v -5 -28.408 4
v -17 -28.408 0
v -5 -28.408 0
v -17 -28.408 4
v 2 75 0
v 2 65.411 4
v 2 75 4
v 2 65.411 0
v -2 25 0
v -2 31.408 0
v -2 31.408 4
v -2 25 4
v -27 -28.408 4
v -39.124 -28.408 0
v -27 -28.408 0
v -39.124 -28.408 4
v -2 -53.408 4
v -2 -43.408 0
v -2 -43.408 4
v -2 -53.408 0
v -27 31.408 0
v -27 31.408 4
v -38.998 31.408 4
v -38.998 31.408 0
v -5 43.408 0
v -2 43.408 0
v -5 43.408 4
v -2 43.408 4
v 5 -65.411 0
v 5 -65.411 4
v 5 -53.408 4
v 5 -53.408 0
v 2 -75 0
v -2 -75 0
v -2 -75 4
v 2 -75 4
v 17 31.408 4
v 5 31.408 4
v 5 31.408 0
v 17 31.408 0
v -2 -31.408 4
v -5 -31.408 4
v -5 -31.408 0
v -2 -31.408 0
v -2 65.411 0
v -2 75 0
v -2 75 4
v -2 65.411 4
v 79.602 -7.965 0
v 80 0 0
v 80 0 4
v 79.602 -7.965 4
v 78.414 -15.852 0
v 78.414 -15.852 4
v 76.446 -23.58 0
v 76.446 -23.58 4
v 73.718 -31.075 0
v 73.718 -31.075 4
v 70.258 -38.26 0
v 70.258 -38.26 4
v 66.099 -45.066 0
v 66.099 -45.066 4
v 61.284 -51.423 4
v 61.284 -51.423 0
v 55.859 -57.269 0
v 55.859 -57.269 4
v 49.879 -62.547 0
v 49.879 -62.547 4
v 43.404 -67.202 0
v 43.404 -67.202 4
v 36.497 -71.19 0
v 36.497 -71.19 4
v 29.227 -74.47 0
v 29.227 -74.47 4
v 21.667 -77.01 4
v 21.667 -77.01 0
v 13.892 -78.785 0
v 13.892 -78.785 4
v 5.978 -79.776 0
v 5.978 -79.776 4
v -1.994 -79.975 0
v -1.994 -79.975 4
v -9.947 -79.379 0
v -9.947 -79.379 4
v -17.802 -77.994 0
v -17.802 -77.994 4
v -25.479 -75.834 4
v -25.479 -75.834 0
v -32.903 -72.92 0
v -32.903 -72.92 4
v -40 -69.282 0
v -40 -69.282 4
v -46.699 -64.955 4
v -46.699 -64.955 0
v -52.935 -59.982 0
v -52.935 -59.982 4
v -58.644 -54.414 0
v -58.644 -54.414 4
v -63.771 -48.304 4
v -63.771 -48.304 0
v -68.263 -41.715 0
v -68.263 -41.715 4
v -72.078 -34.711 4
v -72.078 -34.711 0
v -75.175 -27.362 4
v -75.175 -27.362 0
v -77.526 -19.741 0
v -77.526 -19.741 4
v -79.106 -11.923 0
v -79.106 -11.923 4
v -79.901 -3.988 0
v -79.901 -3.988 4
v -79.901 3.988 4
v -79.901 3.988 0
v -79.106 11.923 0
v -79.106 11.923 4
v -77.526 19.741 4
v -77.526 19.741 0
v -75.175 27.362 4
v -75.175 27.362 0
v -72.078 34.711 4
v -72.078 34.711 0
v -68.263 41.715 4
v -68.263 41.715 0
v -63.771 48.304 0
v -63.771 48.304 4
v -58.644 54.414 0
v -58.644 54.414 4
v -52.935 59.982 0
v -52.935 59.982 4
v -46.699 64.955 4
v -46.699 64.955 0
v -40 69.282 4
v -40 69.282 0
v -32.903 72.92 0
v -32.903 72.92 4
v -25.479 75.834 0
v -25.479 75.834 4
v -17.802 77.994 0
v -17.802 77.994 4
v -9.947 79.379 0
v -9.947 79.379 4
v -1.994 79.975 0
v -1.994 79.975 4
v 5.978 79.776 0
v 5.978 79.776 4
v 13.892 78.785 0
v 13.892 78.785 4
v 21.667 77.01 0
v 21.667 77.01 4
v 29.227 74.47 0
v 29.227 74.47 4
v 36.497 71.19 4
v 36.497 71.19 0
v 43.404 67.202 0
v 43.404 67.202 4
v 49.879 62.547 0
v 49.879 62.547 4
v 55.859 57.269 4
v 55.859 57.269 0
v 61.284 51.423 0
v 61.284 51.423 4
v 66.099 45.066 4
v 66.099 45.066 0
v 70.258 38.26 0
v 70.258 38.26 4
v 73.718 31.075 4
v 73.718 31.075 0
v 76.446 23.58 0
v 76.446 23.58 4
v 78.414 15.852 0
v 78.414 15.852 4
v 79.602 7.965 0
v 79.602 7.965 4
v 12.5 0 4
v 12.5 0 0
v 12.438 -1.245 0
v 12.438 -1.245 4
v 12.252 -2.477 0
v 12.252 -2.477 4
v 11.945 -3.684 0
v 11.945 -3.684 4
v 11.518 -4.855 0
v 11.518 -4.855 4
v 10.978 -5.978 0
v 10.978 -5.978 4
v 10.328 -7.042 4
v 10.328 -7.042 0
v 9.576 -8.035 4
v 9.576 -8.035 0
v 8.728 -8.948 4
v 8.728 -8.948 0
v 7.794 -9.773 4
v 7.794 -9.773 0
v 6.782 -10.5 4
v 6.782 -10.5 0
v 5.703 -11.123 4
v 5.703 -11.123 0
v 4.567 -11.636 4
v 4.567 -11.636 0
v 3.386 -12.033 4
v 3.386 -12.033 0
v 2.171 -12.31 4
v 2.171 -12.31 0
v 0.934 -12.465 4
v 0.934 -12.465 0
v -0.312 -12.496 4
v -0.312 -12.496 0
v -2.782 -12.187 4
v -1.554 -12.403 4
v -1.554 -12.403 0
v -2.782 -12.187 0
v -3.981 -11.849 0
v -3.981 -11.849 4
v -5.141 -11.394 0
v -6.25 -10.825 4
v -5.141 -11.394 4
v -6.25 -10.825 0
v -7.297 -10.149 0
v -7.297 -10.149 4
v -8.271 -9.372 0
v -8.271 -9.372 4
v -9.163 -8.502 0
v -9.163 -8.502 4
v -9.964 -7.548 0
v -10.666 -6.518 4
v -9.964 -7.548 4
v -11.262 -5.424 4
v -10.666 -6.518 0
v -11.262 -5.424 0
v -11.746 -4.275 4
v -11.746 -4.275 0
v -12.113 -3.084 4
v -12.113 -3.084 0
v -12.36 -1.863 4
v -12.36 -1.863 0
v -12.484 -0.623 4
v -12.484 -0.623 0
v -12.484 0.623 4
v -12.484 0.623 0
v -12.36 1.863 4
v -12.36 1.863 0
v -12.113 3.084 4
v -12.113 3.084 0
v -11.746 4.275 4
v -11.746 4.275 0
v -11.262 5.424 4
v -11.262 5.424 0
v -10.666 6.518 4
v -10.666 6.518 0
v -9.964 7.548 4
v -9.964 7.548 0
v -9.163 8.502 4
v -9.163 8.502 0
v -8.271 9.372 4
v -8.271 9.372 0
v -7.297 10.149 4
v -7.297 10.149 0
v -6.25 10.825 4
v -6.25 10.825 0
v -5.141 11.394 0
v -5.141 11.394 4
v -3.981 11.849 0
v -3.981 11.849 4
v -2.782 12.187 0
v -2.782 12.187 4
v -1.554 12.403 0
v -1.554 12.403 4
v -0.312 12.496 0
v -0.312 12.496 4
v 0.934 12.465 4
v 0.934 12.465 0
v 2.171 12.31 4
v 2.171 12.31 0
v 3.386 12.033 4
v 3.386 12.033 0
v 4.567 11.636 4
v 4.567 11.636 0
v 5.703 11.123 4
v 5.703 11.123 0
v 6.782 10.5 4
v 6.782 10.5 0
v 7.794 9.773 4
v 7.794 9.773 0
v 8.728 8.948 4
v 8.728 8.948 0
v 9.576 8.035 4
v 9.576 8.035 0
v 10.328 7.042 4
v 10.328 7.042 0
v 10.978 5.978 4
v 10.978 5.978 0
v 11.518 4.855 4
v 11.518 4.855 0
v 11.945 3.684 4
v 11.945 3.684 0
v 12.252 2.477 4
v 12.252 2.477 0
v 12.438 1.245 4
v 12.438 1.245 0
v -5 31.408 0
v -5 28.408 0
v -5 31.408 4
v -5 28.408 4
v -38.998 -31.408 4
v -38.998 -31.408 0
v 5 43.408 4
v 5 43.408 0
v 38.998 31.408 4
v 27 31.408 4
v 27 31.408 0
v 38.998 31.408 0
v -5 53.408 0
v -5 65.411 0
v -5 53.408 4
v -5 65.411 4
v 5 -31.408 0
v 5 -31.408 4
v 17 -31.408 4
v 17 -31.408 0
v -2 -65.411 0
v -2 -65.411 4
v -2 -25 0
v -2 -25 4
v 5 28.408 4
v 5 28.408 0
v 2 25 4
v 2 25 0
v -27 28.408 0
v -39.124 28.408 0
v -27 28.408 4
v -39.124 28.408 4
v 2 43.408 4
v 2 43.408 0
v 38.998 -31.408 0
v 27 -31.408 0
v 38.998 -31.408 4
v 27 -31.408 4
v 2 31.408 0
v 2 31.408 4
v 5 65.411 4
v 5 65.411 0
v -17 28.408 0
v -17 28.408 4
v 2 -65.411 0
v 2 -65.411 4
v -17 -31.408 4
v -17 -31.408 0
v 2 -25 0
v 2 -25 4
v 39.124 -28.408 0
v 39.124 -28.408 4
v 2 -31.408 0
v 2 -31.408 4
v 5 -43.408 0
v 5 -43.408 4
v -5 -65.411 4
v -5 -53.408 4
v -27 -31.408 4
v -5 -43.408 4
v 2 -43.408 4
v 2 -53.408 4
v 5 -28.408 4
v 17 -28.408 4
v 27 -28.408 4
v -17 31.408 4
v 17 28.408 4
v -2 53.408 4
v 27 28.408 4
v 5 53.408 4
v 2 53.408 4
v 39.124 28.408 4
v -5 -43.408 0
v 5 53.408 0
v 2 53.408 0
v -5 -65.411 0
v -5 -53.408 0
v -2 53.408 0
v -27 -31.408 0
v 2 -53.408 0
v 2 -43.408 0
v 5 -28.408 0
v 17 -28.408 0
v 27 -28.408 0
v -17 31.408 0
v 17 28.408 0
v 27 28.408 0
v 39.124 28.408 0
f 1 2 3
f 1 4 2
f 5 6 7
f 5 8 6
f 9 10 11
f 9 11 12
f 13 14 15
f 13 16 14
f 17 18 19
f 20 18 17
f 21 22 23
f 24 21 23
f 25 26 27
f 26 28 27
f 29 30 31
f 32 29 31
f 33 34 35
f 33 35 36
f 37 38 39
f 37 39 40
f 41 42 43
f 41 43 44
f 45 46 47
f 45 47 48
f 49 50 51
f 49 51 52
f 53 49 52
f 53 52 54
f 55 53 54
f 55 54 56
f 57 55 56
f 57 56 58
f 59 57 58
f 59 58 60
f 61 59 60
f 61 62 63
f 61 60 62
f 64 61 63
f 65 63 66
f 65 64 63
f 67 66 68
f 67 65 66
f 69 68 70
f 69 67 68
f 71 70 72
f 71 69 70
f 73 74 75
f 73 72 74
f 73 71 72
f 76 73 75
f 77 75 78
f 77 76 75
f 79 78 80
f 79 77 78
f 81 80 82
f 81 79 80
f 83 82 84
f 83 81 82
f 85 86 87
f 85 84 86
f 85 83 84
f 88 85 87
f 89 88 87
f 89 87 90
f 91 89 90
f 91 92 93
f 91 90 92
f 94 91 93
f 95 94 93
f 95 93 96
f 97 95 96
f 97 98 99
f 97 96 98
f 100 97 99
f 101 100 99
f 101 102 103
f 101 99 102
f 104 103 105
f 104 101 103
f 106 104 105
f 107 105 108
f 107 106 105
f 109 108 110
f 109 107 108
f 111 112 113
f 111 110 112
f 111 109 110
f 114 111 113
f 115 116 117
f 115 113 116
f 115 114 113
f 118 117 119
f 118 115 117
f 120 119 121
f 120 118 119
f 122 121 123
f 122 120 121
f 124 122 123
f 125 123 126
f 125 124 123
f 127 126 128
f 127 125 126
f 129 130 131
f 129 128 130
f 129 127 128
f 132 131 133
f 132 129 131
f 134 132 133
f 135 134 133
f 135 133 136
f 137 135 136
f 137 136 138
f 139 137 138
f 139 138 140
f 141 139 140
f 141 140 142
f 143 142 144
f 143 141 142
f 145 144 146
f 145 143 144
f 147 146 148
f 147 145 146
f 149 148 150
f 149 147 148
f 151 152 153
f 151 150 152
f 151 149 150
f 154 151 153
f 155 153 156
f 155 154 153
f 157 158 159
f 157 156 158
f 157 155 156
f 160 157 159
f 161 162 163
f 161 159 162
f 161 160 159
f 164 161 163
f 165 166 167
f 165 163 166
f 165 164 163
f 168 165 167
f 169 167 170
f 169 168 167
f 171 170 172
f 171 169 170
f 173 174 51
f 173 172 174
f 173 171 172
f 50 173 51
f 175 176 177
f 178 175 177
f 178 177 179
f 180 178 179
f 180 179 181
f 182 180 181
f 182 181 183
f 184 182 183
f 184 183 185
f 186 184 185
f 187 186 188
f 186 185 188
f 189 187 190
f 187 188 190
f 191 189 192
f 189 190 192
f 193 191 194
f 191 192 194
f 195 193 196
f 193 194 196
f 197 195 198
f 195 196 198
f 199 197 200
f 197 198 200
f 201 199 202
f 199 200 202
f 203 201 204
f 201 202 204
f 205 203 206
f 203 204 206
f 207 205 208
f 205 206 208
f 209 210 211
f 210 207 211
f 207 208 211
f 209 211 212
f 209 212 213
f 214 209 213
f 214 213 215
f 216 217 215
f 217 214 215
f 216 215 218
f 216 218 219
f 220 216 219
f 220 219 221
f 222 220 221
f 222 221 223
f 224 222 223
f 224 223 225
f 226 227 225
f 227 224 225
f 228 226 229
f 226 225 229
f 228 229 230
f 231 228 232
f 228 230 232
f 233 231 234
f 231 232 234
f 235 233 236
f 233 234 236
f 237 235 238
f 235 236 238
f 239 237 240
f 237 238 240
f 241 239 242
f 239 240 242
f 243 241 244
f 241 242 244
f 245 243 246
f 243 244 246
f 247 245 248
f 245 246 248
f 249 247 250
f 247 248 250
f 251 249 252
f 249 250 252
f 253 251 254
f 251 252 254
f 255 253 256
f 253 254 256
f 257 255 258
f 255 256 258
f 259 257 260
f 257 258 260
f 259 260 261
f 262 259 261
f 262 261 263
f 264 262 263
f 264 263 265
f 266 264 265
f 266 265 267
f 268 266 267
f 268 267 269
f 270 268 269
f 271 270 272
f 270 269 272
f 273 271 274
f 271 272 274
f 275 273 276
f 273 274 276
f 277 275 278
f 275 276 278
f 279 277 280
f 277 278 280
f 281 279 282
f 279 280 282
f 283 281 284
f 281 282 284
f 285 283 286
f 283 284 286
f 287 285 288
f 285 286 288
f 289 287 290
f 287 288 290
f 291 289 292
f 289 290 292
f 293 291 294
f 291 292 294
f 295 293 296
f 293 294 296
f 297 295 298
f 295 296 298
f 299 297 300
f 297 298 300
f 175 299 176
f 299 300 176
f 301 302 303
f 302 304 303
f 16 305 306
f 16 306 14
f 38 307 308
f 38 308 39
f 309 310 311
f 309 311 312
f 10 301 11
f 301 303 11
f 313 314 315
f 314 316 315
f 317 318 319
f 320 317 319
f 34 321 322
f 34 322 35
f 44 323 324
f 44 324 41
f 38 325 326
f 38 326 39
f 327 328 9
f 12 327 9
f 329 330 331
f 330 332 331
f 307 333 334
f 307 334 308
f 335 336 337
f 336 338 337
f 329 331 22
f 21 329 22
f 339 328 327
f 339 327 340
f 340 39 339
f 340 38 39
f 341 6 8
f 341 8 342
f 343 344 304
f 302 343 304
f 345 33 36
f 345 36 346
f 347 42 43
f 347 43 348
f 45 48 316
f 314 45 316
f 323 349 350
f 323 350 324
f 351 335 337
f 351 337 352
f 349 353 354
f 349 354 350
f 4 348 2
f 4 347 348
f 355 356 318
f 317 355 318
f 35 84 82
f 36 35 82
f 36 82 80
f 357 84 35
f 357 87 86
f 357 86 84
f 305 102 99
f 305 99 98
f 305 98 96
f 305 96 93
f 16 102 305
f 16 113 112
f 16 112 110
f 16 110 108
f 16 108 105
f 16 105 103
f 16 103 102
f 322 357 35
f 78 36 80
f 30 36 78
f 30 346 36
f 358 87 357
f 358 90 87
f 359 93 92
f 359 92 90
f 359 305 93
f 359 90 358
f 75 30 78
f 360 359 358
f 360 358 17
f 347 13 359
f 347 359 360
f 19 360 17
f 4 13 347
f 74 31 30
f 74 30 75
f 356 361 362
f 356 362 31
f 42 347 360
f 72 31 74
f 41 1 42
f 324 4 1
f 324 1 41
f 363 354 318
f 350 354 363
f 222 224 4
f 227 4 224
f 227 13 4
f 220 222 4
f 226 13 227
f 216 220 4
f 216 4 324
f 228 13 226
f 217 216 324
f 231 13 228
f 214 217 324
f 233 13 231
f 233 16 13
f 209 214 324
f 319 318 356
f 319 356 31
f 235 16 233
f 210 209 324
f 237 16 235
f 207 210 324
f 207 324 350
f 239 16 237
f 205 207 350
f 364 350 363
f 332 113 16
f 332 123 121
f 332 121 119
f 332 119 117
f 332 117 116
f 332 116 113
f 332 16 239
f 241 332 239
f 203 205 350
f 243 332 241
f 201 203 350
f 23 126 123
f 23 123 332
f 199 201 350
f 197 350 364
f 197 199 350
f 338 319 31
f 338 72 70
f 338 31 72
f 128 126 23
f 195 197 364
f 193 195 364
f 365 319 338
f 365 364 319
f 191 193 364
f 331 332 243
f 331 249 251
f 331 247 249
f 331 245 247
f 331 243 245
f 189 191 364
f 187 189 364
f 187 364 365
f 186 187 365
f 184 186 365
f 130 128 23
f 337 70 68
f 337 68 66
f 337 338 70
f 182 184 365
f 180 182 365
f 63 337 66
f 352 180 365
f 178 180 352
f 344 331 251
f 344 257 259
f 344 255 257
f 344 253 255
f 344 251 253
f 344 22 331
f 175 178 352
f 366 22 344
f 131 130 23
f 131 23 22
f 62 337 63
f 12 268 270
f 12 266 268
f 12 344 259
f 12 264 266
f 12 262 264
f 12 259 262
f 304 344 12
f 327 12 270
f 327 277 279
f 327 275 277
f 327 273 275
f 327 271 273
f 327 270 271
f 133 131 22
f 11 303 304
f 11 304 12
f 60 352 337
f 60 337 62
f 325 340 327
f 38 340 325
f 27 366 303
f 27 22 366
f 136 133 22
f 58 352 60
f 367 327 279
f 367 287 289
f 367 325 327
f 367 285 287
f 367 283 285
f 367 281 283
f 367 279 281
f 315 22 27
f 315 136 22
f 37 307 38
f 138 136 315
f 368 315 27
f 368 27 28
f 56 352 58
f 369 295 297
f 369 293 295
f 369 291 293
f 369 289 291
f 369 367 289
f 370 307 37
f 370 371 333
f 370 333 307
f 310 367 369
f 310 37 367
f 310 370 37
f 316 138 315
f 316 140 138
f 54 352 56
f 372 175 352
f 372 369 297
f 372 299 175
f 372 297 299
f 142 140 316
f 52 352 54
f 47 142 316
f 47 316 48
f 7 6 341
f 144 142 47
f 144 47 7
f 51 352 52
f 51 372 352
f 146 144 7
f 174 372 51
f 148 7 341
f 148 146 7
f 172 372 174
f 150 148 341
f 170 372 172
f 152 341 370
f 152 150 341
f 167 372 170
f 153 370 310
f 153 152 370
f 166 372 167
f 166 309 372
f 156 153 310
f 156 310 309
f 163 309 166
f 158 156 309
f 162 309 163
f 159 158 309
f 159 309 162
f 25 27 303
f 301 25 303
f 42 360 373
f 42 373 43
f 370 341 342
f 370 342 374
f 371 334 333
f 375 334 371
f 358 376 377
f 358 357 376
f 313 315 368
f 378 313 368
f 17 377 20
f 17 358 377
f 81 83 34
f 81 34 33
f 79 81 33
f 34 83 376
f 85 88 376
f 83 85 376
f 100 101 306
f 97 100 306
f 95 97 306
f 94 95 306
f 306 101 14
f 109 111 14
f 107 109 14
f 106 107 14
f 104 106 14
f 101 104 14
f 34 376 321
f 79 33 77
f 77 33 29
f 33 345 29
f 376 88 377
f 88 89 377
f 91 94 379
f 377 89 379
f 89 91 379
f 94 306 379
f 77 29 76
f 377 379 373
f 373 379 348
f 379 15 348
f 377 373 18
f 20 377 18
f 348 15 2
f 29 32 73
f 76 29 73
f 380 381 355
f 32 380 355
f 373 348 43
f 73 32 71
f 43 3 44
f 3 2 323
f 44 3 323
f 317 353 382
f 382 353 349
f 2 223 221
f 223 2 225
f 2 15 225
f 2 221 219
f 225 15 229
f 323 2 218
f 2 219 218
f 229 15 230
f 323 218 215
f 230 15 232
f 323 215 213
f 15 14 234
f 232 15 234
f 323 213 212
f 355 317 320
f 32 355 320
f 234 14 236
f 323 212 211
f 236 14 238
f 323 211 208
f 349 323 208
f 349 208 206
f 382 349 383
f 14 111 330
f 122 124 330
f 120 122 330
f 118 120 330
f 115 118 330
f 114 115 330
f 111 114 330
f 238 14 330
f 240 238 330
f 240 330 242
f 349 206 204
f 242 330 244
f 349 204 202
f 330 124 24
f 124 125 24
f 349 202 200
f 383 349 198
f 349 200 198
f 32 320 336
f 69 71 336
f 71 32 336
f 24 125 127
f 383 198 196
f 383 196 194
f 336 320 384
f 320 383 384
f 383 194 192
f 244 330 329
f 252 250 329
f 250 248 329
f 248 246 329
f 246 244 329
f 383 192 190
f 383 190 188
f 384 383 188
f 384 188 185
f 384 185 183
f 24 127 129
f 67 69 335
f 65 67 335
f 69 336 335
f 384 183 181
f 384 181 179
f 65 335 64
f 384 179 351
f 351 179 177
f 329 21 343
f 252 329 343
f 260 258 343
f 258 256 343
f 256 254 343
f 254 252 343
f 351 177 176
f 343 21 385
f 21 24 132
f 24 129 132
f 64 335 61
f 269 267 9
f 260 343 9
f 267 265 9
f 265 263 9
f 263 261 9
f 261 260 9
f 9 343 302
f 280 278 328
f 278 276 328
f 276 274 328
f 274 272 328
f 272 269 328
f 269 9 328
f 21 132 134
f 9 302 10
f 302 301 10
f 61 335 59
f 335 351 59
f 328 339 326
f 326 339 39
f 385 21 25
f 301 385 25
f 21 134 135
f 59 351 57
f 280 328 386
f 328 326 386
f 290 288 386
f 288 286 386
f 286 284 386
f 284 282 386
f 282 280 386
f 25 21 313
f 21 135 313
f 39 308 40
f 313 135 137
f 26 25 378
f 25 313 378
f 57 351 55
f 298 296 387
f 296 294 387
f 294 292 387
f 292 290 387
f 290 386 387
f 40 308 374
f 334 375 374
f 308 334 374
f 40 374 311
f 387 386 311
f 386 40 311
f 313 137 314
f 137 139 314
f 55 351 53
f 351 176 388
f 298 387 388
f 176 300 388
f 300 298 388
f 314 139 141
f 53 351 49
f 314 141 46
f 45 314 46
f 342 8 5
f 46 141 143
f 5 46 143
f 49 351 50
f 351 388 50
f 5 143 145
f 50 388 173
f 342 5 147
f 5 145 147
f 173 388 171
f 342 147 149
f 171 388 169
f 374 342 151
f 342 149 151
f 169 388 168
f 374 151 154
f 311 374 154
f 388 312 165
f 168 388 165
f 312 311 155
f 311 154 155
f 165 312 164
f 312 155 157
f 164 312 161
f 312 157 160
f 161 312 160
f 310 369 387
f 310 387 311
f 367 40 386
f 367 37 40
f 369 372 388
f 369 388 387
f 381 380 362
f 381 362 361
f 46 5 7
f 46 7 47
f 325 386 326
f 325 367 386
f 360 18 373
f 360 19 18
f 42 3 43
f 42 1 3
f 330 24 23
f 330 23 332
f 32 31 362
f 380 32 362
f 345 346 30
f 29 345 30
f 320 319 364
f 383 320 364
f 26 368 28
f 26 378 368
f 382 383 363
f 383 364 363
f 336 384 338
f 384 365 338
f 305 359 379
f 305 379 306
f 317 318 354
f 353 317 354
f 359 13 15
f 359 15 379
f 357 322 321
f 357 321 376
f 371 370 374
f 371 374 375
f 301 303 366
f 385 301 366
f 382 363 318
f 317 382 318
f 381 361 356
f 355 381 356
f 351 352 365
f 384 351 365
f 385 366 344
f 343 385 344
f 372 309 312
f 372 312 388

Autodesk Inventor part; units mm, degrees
ref_plane "YZ Plane" through (0, 0, 0) normal (1, 0, 0) x (0, 1, 0)
ref_plane "XZ Plane" through (0, 0, 0) normal (0, 1, 0) x (-1, 0, 0)
ref_plane "XY Plane" through (0, 0, 0) normal (0, 0, 1) x (1, 0, 0)
sketch "Эскиз1" plane through (0, 0, 0) normal (0, 0, 1) x (1, 0, 0)
  circle A0 centre (0, 0) radius 80 projected
  line L0 (-52.7251, -56.1362) -> (-52.7358, -38.0942) construction
  arc A1 (-51.7364, -37.0936) -> (-52.7358, -38.0942) centre (-51.7358, -38.0936) ccw construction
  line L1 (-51.7364, -37.0936) -> (-13.2571, -37.0709) construction
  arc A2 (-12.2565, -38.0703) -> (-13.2571, -37.0709) centre (-13.2565, -38.0709) ccw construction
  line L2 (-12.2565, -38.0703) -> (-12.2459, -56.1122) construction
  arc A3 (-13.2453, -57.1128) -> (-12.2459, -56.1122) centre (-13.2459, -56.1128) ccw construction
  line L3 (-13.2453, -57.1128) -> (-51.7245, -57.1356) construction
  arc A4 (-52.7251, -56.1362) -> (-51.7245, -57.1356) centre (-51.7251, -56.1356) ccw construction
  circle A5 centre (-11.4805, -27.7164) radius 3.15 construction
  circle A6 centre (-27.7164, 11.4805) radius 3.15 construction
  circle A7 centre (11.4805, 27.7164) radius 3.15 construction
  circle A8 centre (27.7164, -11.4805) radius 3.15 construction
  circle A9 centre (0, 0) radius 12.5
  circle A10 centre (0, 0) radius 39.5 construction
  point P0 (0, 0)
  dimension "d10" = 25
extrude "Выдавливание1" add sketch "Эскиз1" along normal blind 4
sketch "Эскиз2" plane through (0, 0, 0) normal (0, 0, -1) x (-1, 0, 0)
  circle A0 centre (0, 0) radius 80 projected
  line L0 (0, 80) -> (0, -80) construction
  line L1 (2, -75) -> (-2, -75)
  line L2 (-2, -75) -> (-2, 75)
  line L3 (-2, 75) -> (2, 75)
  line L4 (2, 75) -> (2, -75)
  line L5 (2, -75) -> (-2, 75) construction
  line L6 (-2, -75) -> (2, 75) construction
  line L7 (-2, 25) -> (2, 25)
  line L8 (-2, -25) -> (2, -25)
  point P0 (0, -25)
  point P1 (0, 75)
  point P2 (0, 25)
  dimension "d2" = 4
  dimension "d3" = 150
  dimension "d4" = 50
  dimension "d5" = 50
extrude "Выдавливание2" cut sketch "Эскиз2" against normal blind 10 contours L1 L2 L8 L4 | L7 L2 L3 L4
sketch "Эскиз3" plane through (0, 0, 4) normal (0, 0, 1) x (1, 0, 0)
  line L0 (5, 53.408) -> (2, 53.408)
  line L1 (2, 31.408) -> (2, 43.408)
  line L2 (17, 28.408) -> (5, 28.408)
  line L3 (39.1243, 28.408) -> (27, 28.408)
  line L4 (2, 53.408) -> (2, 65.4106)
  line L5 (5, 65.4106) -> (5, 53.408)
  line L6 (2, 65.4106) -> (5, 65.4106)
  line L7 (2, 43.408) -> (5, 43.408)
  line L8 (5, 31.408) -> (2, 31.408)
  line L9 (5, 43.408) -> (5, 31.408)
  line L10 (5, 28.408) -> (5, 31.408)
  line L11 (5, 31.408) -> (17, 31.408)
  line L12 (27, 31.408) -> (38.9975, 31.408)
  line L13 (38.9975, 31.408) -> (39.1243, 28.408)
  line L14 (17, 31.408) -> (17, 28.408)
  line L15 (27, 28.408) -> (27, 31.408)
  line L16 (5, 65.4121) -> (5, 65.4106)
  line L17 (102, 0) -> (-112, 0) construction
  line L18 (5, -53.408) -> (2, -53.408)
  line L19 (2, -31.408) -> (2, -43.408)
  line L20 (17, -28.408) -> (5, -28.408)
  line L21 (39.1243, -28.408) -> (27, -28.408)
  line L22 (2, -53.408) -> (2, -65.4106)
  line L23 (5, -65.4106) -> (5, -53.408)
  line L24 (2, -65.4106) -> (5, -65.4106)
  line L25 (2, -43.408) -> (5, -43.408)
  line L26 (5, -31.408) -> (2, -31.408)
  line L27 (5, -43.408) -> (5, -31.408)
  line L28 (5, -28.408) -> (5, -31.408)
  line L29 (5, -31.408) -> (17, -31.408)
  line L30 (27, -31.408) -> (38.9975, -31.408)
  line L31 (38.9975, -31.408) -> (39.1243, -28.408)
  line L32 (17, -31.408) -> (17, -28.408)
  line L33 (27, -28.408) -> (27, -31.408)
  line L34 (5, -65.4121) -> (5, -65.4106)
  line L35 (0, 116) -> (0, -113) construction
  line L36 (-5, 53.408) -> (-2, 53.408)
  line L37 (-2, 31.408) -> (-2, 43.408)
  line L38 (-17, 28.408) -> (-5, 28.408)
  line L39 (-39.1243, 28.408) -> (-27, 28.408)
  line L40 (-2, 53.408) -> (-2, 65.4106)
  line L41 (-5, 65.4106) -> (-5, 53.408)
  line L42 (-2, 65.4106) -> (-5, 65.4106)
  line L43 (-2, 43.408) -> (-5, 43.408)
  line L44 (-5, 31.408) -> (-2, 31.408)
  line L45 (-5, 43.408) -> (-5, 31.408)
  line L46 (-5, 28.408) -> (-5, 31.408)
  line L47 (-5, 31.408) -> (-17, 31.408)
  line L48 (-27, 31.408) -> (-38.9975, 31.408)
  line L49 (-38.9975, 31.408) -> (-39.1243, 28.408)
  line L50 (-17, 31.408) -> (-17, 28.408)
  line L51 (-27, 28.408) -> (-27, 31.408)
  line L52 (-5, 65.4121) -> (-5, 65.4106)
  line L53 (-17, -31.408) -> (-17, -28.408)
  line L54 (-17, -28.408) -> (-5, -28.408)
  line L55 (-5, -28.408) -> (-5, -31.408)
  line L56 (-5, -31.408) -> (-17, -31.408)
  line L57 (-5, -31.408) -> (-2, -31.408)
  line L58 (-5, -43.408) -> (-5, -31.408)
  line L59 (-2, -31.408) -> (-2, -43.408)
  line L60 (-2, -43.408) -> (-5, -43.408)
  line L61 (-5, -53.408) -> (-2, -53.408)
  line L62 (-5, -65.4106) -> (-5, -53.408)
  line L63 (-5, -65.4121) -> (-5, -65.4106)
  line L64 (-2, -53.408) -> (-2, -65.4106)
  line L65 (-2, -65.4106) -> (-5, -65.4106)
  line L66 (-27, -28.408) -> (-27, -31.408)
  line L67 (-27, -31.408) -> (-38.9975, -31.408)
  line L68 (-38.9975, -31.408) -> (-39.1243, -28.408)
  line L69 (-39.1243, -28.408) -> (-27, -28.408)
  point P0 (0, 0)
extrude "Выдавливание3" cut sketch "Эскиз3" against normal blind 10
properties part number "лицо1"
